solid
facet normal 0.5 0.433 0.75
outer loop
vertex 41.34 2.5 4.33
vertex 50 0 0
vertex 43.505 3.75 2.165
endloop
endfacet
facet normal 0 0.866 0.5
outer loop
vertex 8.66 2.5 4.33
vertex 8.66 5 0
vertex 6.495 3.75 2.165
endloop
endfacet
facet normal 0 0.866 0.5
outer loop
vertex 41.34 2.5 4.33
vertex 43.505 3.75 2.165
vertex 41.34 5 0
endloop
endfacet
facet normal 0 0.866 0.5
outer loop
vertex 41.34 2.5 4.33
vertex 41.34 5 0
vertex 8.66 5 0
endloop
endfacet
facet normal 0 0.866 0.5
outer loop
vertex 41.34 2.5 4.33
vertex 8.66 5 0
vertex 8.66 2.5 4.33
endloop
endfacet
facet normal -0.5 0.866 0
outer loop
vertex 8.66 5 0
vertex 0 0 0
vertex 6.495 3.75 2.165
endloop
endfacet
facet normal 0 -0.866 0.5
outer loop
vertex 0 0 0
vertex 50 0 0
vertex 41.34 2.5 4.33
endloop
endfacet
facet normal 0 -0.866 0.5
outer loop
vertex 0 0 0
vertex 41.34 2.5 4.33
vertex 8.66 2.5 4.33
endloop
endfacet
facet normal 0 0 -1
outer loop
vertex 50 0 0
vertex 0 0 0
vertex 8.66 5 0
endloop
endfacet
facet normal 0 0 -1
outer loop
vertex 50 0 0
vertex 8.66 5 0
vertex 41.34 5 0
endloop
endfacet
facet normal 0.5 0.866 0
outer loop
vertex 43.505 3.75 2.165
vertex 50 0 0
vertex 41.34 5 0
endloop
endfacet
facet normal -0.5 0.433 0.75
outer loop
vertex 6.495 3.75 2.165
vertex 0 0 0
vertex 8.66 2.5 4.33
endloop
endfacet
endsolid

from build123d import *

# Parameters (mm, degrees)
F1_DEPTH = 40
F3_DEPTH = 25
F5_DEPTH = 25


with BuildPart() as f1:
    # F0 (on Right) → F1 (new body)
    with BuildSketch(Plane.YZ):
        Polygon((2.5, 4.3301270189), (0, 0), (5, 0), align=None)
    extrude(amount=F1_DEPTH)

    # F2 (on Top) → F3 (cut)
    with BuildSketch(Plane.XY):
        Polygon((0, 9.8450229721), (0, 0), (17.0520799894, 9.8450229721), align=None)
    extrude(amount=F3_DEPTH, mode=Mode.SUBTRACT)

    # F4 (on face) → F5 (cut)
    with BuildSketch(Plane(origin=(0, 0, 0), x_dir=(1, 0, 0), z_dir=(0, -0.8660254038, 0.5))):
        Polygon((0, 9.1414814892), (0, 0), (15.8335103958, 9.1414814892), align=None)
    extrude(amount=-F5_DEPTH, mode=Mode.SUBTRACT)

    # F7: F1 across plane


with BuildPart() as f1_1:
    add(f1.part)
    add(f1.part.mirror(Plane.YZ.offset(25)))


solid = f1_1.part
